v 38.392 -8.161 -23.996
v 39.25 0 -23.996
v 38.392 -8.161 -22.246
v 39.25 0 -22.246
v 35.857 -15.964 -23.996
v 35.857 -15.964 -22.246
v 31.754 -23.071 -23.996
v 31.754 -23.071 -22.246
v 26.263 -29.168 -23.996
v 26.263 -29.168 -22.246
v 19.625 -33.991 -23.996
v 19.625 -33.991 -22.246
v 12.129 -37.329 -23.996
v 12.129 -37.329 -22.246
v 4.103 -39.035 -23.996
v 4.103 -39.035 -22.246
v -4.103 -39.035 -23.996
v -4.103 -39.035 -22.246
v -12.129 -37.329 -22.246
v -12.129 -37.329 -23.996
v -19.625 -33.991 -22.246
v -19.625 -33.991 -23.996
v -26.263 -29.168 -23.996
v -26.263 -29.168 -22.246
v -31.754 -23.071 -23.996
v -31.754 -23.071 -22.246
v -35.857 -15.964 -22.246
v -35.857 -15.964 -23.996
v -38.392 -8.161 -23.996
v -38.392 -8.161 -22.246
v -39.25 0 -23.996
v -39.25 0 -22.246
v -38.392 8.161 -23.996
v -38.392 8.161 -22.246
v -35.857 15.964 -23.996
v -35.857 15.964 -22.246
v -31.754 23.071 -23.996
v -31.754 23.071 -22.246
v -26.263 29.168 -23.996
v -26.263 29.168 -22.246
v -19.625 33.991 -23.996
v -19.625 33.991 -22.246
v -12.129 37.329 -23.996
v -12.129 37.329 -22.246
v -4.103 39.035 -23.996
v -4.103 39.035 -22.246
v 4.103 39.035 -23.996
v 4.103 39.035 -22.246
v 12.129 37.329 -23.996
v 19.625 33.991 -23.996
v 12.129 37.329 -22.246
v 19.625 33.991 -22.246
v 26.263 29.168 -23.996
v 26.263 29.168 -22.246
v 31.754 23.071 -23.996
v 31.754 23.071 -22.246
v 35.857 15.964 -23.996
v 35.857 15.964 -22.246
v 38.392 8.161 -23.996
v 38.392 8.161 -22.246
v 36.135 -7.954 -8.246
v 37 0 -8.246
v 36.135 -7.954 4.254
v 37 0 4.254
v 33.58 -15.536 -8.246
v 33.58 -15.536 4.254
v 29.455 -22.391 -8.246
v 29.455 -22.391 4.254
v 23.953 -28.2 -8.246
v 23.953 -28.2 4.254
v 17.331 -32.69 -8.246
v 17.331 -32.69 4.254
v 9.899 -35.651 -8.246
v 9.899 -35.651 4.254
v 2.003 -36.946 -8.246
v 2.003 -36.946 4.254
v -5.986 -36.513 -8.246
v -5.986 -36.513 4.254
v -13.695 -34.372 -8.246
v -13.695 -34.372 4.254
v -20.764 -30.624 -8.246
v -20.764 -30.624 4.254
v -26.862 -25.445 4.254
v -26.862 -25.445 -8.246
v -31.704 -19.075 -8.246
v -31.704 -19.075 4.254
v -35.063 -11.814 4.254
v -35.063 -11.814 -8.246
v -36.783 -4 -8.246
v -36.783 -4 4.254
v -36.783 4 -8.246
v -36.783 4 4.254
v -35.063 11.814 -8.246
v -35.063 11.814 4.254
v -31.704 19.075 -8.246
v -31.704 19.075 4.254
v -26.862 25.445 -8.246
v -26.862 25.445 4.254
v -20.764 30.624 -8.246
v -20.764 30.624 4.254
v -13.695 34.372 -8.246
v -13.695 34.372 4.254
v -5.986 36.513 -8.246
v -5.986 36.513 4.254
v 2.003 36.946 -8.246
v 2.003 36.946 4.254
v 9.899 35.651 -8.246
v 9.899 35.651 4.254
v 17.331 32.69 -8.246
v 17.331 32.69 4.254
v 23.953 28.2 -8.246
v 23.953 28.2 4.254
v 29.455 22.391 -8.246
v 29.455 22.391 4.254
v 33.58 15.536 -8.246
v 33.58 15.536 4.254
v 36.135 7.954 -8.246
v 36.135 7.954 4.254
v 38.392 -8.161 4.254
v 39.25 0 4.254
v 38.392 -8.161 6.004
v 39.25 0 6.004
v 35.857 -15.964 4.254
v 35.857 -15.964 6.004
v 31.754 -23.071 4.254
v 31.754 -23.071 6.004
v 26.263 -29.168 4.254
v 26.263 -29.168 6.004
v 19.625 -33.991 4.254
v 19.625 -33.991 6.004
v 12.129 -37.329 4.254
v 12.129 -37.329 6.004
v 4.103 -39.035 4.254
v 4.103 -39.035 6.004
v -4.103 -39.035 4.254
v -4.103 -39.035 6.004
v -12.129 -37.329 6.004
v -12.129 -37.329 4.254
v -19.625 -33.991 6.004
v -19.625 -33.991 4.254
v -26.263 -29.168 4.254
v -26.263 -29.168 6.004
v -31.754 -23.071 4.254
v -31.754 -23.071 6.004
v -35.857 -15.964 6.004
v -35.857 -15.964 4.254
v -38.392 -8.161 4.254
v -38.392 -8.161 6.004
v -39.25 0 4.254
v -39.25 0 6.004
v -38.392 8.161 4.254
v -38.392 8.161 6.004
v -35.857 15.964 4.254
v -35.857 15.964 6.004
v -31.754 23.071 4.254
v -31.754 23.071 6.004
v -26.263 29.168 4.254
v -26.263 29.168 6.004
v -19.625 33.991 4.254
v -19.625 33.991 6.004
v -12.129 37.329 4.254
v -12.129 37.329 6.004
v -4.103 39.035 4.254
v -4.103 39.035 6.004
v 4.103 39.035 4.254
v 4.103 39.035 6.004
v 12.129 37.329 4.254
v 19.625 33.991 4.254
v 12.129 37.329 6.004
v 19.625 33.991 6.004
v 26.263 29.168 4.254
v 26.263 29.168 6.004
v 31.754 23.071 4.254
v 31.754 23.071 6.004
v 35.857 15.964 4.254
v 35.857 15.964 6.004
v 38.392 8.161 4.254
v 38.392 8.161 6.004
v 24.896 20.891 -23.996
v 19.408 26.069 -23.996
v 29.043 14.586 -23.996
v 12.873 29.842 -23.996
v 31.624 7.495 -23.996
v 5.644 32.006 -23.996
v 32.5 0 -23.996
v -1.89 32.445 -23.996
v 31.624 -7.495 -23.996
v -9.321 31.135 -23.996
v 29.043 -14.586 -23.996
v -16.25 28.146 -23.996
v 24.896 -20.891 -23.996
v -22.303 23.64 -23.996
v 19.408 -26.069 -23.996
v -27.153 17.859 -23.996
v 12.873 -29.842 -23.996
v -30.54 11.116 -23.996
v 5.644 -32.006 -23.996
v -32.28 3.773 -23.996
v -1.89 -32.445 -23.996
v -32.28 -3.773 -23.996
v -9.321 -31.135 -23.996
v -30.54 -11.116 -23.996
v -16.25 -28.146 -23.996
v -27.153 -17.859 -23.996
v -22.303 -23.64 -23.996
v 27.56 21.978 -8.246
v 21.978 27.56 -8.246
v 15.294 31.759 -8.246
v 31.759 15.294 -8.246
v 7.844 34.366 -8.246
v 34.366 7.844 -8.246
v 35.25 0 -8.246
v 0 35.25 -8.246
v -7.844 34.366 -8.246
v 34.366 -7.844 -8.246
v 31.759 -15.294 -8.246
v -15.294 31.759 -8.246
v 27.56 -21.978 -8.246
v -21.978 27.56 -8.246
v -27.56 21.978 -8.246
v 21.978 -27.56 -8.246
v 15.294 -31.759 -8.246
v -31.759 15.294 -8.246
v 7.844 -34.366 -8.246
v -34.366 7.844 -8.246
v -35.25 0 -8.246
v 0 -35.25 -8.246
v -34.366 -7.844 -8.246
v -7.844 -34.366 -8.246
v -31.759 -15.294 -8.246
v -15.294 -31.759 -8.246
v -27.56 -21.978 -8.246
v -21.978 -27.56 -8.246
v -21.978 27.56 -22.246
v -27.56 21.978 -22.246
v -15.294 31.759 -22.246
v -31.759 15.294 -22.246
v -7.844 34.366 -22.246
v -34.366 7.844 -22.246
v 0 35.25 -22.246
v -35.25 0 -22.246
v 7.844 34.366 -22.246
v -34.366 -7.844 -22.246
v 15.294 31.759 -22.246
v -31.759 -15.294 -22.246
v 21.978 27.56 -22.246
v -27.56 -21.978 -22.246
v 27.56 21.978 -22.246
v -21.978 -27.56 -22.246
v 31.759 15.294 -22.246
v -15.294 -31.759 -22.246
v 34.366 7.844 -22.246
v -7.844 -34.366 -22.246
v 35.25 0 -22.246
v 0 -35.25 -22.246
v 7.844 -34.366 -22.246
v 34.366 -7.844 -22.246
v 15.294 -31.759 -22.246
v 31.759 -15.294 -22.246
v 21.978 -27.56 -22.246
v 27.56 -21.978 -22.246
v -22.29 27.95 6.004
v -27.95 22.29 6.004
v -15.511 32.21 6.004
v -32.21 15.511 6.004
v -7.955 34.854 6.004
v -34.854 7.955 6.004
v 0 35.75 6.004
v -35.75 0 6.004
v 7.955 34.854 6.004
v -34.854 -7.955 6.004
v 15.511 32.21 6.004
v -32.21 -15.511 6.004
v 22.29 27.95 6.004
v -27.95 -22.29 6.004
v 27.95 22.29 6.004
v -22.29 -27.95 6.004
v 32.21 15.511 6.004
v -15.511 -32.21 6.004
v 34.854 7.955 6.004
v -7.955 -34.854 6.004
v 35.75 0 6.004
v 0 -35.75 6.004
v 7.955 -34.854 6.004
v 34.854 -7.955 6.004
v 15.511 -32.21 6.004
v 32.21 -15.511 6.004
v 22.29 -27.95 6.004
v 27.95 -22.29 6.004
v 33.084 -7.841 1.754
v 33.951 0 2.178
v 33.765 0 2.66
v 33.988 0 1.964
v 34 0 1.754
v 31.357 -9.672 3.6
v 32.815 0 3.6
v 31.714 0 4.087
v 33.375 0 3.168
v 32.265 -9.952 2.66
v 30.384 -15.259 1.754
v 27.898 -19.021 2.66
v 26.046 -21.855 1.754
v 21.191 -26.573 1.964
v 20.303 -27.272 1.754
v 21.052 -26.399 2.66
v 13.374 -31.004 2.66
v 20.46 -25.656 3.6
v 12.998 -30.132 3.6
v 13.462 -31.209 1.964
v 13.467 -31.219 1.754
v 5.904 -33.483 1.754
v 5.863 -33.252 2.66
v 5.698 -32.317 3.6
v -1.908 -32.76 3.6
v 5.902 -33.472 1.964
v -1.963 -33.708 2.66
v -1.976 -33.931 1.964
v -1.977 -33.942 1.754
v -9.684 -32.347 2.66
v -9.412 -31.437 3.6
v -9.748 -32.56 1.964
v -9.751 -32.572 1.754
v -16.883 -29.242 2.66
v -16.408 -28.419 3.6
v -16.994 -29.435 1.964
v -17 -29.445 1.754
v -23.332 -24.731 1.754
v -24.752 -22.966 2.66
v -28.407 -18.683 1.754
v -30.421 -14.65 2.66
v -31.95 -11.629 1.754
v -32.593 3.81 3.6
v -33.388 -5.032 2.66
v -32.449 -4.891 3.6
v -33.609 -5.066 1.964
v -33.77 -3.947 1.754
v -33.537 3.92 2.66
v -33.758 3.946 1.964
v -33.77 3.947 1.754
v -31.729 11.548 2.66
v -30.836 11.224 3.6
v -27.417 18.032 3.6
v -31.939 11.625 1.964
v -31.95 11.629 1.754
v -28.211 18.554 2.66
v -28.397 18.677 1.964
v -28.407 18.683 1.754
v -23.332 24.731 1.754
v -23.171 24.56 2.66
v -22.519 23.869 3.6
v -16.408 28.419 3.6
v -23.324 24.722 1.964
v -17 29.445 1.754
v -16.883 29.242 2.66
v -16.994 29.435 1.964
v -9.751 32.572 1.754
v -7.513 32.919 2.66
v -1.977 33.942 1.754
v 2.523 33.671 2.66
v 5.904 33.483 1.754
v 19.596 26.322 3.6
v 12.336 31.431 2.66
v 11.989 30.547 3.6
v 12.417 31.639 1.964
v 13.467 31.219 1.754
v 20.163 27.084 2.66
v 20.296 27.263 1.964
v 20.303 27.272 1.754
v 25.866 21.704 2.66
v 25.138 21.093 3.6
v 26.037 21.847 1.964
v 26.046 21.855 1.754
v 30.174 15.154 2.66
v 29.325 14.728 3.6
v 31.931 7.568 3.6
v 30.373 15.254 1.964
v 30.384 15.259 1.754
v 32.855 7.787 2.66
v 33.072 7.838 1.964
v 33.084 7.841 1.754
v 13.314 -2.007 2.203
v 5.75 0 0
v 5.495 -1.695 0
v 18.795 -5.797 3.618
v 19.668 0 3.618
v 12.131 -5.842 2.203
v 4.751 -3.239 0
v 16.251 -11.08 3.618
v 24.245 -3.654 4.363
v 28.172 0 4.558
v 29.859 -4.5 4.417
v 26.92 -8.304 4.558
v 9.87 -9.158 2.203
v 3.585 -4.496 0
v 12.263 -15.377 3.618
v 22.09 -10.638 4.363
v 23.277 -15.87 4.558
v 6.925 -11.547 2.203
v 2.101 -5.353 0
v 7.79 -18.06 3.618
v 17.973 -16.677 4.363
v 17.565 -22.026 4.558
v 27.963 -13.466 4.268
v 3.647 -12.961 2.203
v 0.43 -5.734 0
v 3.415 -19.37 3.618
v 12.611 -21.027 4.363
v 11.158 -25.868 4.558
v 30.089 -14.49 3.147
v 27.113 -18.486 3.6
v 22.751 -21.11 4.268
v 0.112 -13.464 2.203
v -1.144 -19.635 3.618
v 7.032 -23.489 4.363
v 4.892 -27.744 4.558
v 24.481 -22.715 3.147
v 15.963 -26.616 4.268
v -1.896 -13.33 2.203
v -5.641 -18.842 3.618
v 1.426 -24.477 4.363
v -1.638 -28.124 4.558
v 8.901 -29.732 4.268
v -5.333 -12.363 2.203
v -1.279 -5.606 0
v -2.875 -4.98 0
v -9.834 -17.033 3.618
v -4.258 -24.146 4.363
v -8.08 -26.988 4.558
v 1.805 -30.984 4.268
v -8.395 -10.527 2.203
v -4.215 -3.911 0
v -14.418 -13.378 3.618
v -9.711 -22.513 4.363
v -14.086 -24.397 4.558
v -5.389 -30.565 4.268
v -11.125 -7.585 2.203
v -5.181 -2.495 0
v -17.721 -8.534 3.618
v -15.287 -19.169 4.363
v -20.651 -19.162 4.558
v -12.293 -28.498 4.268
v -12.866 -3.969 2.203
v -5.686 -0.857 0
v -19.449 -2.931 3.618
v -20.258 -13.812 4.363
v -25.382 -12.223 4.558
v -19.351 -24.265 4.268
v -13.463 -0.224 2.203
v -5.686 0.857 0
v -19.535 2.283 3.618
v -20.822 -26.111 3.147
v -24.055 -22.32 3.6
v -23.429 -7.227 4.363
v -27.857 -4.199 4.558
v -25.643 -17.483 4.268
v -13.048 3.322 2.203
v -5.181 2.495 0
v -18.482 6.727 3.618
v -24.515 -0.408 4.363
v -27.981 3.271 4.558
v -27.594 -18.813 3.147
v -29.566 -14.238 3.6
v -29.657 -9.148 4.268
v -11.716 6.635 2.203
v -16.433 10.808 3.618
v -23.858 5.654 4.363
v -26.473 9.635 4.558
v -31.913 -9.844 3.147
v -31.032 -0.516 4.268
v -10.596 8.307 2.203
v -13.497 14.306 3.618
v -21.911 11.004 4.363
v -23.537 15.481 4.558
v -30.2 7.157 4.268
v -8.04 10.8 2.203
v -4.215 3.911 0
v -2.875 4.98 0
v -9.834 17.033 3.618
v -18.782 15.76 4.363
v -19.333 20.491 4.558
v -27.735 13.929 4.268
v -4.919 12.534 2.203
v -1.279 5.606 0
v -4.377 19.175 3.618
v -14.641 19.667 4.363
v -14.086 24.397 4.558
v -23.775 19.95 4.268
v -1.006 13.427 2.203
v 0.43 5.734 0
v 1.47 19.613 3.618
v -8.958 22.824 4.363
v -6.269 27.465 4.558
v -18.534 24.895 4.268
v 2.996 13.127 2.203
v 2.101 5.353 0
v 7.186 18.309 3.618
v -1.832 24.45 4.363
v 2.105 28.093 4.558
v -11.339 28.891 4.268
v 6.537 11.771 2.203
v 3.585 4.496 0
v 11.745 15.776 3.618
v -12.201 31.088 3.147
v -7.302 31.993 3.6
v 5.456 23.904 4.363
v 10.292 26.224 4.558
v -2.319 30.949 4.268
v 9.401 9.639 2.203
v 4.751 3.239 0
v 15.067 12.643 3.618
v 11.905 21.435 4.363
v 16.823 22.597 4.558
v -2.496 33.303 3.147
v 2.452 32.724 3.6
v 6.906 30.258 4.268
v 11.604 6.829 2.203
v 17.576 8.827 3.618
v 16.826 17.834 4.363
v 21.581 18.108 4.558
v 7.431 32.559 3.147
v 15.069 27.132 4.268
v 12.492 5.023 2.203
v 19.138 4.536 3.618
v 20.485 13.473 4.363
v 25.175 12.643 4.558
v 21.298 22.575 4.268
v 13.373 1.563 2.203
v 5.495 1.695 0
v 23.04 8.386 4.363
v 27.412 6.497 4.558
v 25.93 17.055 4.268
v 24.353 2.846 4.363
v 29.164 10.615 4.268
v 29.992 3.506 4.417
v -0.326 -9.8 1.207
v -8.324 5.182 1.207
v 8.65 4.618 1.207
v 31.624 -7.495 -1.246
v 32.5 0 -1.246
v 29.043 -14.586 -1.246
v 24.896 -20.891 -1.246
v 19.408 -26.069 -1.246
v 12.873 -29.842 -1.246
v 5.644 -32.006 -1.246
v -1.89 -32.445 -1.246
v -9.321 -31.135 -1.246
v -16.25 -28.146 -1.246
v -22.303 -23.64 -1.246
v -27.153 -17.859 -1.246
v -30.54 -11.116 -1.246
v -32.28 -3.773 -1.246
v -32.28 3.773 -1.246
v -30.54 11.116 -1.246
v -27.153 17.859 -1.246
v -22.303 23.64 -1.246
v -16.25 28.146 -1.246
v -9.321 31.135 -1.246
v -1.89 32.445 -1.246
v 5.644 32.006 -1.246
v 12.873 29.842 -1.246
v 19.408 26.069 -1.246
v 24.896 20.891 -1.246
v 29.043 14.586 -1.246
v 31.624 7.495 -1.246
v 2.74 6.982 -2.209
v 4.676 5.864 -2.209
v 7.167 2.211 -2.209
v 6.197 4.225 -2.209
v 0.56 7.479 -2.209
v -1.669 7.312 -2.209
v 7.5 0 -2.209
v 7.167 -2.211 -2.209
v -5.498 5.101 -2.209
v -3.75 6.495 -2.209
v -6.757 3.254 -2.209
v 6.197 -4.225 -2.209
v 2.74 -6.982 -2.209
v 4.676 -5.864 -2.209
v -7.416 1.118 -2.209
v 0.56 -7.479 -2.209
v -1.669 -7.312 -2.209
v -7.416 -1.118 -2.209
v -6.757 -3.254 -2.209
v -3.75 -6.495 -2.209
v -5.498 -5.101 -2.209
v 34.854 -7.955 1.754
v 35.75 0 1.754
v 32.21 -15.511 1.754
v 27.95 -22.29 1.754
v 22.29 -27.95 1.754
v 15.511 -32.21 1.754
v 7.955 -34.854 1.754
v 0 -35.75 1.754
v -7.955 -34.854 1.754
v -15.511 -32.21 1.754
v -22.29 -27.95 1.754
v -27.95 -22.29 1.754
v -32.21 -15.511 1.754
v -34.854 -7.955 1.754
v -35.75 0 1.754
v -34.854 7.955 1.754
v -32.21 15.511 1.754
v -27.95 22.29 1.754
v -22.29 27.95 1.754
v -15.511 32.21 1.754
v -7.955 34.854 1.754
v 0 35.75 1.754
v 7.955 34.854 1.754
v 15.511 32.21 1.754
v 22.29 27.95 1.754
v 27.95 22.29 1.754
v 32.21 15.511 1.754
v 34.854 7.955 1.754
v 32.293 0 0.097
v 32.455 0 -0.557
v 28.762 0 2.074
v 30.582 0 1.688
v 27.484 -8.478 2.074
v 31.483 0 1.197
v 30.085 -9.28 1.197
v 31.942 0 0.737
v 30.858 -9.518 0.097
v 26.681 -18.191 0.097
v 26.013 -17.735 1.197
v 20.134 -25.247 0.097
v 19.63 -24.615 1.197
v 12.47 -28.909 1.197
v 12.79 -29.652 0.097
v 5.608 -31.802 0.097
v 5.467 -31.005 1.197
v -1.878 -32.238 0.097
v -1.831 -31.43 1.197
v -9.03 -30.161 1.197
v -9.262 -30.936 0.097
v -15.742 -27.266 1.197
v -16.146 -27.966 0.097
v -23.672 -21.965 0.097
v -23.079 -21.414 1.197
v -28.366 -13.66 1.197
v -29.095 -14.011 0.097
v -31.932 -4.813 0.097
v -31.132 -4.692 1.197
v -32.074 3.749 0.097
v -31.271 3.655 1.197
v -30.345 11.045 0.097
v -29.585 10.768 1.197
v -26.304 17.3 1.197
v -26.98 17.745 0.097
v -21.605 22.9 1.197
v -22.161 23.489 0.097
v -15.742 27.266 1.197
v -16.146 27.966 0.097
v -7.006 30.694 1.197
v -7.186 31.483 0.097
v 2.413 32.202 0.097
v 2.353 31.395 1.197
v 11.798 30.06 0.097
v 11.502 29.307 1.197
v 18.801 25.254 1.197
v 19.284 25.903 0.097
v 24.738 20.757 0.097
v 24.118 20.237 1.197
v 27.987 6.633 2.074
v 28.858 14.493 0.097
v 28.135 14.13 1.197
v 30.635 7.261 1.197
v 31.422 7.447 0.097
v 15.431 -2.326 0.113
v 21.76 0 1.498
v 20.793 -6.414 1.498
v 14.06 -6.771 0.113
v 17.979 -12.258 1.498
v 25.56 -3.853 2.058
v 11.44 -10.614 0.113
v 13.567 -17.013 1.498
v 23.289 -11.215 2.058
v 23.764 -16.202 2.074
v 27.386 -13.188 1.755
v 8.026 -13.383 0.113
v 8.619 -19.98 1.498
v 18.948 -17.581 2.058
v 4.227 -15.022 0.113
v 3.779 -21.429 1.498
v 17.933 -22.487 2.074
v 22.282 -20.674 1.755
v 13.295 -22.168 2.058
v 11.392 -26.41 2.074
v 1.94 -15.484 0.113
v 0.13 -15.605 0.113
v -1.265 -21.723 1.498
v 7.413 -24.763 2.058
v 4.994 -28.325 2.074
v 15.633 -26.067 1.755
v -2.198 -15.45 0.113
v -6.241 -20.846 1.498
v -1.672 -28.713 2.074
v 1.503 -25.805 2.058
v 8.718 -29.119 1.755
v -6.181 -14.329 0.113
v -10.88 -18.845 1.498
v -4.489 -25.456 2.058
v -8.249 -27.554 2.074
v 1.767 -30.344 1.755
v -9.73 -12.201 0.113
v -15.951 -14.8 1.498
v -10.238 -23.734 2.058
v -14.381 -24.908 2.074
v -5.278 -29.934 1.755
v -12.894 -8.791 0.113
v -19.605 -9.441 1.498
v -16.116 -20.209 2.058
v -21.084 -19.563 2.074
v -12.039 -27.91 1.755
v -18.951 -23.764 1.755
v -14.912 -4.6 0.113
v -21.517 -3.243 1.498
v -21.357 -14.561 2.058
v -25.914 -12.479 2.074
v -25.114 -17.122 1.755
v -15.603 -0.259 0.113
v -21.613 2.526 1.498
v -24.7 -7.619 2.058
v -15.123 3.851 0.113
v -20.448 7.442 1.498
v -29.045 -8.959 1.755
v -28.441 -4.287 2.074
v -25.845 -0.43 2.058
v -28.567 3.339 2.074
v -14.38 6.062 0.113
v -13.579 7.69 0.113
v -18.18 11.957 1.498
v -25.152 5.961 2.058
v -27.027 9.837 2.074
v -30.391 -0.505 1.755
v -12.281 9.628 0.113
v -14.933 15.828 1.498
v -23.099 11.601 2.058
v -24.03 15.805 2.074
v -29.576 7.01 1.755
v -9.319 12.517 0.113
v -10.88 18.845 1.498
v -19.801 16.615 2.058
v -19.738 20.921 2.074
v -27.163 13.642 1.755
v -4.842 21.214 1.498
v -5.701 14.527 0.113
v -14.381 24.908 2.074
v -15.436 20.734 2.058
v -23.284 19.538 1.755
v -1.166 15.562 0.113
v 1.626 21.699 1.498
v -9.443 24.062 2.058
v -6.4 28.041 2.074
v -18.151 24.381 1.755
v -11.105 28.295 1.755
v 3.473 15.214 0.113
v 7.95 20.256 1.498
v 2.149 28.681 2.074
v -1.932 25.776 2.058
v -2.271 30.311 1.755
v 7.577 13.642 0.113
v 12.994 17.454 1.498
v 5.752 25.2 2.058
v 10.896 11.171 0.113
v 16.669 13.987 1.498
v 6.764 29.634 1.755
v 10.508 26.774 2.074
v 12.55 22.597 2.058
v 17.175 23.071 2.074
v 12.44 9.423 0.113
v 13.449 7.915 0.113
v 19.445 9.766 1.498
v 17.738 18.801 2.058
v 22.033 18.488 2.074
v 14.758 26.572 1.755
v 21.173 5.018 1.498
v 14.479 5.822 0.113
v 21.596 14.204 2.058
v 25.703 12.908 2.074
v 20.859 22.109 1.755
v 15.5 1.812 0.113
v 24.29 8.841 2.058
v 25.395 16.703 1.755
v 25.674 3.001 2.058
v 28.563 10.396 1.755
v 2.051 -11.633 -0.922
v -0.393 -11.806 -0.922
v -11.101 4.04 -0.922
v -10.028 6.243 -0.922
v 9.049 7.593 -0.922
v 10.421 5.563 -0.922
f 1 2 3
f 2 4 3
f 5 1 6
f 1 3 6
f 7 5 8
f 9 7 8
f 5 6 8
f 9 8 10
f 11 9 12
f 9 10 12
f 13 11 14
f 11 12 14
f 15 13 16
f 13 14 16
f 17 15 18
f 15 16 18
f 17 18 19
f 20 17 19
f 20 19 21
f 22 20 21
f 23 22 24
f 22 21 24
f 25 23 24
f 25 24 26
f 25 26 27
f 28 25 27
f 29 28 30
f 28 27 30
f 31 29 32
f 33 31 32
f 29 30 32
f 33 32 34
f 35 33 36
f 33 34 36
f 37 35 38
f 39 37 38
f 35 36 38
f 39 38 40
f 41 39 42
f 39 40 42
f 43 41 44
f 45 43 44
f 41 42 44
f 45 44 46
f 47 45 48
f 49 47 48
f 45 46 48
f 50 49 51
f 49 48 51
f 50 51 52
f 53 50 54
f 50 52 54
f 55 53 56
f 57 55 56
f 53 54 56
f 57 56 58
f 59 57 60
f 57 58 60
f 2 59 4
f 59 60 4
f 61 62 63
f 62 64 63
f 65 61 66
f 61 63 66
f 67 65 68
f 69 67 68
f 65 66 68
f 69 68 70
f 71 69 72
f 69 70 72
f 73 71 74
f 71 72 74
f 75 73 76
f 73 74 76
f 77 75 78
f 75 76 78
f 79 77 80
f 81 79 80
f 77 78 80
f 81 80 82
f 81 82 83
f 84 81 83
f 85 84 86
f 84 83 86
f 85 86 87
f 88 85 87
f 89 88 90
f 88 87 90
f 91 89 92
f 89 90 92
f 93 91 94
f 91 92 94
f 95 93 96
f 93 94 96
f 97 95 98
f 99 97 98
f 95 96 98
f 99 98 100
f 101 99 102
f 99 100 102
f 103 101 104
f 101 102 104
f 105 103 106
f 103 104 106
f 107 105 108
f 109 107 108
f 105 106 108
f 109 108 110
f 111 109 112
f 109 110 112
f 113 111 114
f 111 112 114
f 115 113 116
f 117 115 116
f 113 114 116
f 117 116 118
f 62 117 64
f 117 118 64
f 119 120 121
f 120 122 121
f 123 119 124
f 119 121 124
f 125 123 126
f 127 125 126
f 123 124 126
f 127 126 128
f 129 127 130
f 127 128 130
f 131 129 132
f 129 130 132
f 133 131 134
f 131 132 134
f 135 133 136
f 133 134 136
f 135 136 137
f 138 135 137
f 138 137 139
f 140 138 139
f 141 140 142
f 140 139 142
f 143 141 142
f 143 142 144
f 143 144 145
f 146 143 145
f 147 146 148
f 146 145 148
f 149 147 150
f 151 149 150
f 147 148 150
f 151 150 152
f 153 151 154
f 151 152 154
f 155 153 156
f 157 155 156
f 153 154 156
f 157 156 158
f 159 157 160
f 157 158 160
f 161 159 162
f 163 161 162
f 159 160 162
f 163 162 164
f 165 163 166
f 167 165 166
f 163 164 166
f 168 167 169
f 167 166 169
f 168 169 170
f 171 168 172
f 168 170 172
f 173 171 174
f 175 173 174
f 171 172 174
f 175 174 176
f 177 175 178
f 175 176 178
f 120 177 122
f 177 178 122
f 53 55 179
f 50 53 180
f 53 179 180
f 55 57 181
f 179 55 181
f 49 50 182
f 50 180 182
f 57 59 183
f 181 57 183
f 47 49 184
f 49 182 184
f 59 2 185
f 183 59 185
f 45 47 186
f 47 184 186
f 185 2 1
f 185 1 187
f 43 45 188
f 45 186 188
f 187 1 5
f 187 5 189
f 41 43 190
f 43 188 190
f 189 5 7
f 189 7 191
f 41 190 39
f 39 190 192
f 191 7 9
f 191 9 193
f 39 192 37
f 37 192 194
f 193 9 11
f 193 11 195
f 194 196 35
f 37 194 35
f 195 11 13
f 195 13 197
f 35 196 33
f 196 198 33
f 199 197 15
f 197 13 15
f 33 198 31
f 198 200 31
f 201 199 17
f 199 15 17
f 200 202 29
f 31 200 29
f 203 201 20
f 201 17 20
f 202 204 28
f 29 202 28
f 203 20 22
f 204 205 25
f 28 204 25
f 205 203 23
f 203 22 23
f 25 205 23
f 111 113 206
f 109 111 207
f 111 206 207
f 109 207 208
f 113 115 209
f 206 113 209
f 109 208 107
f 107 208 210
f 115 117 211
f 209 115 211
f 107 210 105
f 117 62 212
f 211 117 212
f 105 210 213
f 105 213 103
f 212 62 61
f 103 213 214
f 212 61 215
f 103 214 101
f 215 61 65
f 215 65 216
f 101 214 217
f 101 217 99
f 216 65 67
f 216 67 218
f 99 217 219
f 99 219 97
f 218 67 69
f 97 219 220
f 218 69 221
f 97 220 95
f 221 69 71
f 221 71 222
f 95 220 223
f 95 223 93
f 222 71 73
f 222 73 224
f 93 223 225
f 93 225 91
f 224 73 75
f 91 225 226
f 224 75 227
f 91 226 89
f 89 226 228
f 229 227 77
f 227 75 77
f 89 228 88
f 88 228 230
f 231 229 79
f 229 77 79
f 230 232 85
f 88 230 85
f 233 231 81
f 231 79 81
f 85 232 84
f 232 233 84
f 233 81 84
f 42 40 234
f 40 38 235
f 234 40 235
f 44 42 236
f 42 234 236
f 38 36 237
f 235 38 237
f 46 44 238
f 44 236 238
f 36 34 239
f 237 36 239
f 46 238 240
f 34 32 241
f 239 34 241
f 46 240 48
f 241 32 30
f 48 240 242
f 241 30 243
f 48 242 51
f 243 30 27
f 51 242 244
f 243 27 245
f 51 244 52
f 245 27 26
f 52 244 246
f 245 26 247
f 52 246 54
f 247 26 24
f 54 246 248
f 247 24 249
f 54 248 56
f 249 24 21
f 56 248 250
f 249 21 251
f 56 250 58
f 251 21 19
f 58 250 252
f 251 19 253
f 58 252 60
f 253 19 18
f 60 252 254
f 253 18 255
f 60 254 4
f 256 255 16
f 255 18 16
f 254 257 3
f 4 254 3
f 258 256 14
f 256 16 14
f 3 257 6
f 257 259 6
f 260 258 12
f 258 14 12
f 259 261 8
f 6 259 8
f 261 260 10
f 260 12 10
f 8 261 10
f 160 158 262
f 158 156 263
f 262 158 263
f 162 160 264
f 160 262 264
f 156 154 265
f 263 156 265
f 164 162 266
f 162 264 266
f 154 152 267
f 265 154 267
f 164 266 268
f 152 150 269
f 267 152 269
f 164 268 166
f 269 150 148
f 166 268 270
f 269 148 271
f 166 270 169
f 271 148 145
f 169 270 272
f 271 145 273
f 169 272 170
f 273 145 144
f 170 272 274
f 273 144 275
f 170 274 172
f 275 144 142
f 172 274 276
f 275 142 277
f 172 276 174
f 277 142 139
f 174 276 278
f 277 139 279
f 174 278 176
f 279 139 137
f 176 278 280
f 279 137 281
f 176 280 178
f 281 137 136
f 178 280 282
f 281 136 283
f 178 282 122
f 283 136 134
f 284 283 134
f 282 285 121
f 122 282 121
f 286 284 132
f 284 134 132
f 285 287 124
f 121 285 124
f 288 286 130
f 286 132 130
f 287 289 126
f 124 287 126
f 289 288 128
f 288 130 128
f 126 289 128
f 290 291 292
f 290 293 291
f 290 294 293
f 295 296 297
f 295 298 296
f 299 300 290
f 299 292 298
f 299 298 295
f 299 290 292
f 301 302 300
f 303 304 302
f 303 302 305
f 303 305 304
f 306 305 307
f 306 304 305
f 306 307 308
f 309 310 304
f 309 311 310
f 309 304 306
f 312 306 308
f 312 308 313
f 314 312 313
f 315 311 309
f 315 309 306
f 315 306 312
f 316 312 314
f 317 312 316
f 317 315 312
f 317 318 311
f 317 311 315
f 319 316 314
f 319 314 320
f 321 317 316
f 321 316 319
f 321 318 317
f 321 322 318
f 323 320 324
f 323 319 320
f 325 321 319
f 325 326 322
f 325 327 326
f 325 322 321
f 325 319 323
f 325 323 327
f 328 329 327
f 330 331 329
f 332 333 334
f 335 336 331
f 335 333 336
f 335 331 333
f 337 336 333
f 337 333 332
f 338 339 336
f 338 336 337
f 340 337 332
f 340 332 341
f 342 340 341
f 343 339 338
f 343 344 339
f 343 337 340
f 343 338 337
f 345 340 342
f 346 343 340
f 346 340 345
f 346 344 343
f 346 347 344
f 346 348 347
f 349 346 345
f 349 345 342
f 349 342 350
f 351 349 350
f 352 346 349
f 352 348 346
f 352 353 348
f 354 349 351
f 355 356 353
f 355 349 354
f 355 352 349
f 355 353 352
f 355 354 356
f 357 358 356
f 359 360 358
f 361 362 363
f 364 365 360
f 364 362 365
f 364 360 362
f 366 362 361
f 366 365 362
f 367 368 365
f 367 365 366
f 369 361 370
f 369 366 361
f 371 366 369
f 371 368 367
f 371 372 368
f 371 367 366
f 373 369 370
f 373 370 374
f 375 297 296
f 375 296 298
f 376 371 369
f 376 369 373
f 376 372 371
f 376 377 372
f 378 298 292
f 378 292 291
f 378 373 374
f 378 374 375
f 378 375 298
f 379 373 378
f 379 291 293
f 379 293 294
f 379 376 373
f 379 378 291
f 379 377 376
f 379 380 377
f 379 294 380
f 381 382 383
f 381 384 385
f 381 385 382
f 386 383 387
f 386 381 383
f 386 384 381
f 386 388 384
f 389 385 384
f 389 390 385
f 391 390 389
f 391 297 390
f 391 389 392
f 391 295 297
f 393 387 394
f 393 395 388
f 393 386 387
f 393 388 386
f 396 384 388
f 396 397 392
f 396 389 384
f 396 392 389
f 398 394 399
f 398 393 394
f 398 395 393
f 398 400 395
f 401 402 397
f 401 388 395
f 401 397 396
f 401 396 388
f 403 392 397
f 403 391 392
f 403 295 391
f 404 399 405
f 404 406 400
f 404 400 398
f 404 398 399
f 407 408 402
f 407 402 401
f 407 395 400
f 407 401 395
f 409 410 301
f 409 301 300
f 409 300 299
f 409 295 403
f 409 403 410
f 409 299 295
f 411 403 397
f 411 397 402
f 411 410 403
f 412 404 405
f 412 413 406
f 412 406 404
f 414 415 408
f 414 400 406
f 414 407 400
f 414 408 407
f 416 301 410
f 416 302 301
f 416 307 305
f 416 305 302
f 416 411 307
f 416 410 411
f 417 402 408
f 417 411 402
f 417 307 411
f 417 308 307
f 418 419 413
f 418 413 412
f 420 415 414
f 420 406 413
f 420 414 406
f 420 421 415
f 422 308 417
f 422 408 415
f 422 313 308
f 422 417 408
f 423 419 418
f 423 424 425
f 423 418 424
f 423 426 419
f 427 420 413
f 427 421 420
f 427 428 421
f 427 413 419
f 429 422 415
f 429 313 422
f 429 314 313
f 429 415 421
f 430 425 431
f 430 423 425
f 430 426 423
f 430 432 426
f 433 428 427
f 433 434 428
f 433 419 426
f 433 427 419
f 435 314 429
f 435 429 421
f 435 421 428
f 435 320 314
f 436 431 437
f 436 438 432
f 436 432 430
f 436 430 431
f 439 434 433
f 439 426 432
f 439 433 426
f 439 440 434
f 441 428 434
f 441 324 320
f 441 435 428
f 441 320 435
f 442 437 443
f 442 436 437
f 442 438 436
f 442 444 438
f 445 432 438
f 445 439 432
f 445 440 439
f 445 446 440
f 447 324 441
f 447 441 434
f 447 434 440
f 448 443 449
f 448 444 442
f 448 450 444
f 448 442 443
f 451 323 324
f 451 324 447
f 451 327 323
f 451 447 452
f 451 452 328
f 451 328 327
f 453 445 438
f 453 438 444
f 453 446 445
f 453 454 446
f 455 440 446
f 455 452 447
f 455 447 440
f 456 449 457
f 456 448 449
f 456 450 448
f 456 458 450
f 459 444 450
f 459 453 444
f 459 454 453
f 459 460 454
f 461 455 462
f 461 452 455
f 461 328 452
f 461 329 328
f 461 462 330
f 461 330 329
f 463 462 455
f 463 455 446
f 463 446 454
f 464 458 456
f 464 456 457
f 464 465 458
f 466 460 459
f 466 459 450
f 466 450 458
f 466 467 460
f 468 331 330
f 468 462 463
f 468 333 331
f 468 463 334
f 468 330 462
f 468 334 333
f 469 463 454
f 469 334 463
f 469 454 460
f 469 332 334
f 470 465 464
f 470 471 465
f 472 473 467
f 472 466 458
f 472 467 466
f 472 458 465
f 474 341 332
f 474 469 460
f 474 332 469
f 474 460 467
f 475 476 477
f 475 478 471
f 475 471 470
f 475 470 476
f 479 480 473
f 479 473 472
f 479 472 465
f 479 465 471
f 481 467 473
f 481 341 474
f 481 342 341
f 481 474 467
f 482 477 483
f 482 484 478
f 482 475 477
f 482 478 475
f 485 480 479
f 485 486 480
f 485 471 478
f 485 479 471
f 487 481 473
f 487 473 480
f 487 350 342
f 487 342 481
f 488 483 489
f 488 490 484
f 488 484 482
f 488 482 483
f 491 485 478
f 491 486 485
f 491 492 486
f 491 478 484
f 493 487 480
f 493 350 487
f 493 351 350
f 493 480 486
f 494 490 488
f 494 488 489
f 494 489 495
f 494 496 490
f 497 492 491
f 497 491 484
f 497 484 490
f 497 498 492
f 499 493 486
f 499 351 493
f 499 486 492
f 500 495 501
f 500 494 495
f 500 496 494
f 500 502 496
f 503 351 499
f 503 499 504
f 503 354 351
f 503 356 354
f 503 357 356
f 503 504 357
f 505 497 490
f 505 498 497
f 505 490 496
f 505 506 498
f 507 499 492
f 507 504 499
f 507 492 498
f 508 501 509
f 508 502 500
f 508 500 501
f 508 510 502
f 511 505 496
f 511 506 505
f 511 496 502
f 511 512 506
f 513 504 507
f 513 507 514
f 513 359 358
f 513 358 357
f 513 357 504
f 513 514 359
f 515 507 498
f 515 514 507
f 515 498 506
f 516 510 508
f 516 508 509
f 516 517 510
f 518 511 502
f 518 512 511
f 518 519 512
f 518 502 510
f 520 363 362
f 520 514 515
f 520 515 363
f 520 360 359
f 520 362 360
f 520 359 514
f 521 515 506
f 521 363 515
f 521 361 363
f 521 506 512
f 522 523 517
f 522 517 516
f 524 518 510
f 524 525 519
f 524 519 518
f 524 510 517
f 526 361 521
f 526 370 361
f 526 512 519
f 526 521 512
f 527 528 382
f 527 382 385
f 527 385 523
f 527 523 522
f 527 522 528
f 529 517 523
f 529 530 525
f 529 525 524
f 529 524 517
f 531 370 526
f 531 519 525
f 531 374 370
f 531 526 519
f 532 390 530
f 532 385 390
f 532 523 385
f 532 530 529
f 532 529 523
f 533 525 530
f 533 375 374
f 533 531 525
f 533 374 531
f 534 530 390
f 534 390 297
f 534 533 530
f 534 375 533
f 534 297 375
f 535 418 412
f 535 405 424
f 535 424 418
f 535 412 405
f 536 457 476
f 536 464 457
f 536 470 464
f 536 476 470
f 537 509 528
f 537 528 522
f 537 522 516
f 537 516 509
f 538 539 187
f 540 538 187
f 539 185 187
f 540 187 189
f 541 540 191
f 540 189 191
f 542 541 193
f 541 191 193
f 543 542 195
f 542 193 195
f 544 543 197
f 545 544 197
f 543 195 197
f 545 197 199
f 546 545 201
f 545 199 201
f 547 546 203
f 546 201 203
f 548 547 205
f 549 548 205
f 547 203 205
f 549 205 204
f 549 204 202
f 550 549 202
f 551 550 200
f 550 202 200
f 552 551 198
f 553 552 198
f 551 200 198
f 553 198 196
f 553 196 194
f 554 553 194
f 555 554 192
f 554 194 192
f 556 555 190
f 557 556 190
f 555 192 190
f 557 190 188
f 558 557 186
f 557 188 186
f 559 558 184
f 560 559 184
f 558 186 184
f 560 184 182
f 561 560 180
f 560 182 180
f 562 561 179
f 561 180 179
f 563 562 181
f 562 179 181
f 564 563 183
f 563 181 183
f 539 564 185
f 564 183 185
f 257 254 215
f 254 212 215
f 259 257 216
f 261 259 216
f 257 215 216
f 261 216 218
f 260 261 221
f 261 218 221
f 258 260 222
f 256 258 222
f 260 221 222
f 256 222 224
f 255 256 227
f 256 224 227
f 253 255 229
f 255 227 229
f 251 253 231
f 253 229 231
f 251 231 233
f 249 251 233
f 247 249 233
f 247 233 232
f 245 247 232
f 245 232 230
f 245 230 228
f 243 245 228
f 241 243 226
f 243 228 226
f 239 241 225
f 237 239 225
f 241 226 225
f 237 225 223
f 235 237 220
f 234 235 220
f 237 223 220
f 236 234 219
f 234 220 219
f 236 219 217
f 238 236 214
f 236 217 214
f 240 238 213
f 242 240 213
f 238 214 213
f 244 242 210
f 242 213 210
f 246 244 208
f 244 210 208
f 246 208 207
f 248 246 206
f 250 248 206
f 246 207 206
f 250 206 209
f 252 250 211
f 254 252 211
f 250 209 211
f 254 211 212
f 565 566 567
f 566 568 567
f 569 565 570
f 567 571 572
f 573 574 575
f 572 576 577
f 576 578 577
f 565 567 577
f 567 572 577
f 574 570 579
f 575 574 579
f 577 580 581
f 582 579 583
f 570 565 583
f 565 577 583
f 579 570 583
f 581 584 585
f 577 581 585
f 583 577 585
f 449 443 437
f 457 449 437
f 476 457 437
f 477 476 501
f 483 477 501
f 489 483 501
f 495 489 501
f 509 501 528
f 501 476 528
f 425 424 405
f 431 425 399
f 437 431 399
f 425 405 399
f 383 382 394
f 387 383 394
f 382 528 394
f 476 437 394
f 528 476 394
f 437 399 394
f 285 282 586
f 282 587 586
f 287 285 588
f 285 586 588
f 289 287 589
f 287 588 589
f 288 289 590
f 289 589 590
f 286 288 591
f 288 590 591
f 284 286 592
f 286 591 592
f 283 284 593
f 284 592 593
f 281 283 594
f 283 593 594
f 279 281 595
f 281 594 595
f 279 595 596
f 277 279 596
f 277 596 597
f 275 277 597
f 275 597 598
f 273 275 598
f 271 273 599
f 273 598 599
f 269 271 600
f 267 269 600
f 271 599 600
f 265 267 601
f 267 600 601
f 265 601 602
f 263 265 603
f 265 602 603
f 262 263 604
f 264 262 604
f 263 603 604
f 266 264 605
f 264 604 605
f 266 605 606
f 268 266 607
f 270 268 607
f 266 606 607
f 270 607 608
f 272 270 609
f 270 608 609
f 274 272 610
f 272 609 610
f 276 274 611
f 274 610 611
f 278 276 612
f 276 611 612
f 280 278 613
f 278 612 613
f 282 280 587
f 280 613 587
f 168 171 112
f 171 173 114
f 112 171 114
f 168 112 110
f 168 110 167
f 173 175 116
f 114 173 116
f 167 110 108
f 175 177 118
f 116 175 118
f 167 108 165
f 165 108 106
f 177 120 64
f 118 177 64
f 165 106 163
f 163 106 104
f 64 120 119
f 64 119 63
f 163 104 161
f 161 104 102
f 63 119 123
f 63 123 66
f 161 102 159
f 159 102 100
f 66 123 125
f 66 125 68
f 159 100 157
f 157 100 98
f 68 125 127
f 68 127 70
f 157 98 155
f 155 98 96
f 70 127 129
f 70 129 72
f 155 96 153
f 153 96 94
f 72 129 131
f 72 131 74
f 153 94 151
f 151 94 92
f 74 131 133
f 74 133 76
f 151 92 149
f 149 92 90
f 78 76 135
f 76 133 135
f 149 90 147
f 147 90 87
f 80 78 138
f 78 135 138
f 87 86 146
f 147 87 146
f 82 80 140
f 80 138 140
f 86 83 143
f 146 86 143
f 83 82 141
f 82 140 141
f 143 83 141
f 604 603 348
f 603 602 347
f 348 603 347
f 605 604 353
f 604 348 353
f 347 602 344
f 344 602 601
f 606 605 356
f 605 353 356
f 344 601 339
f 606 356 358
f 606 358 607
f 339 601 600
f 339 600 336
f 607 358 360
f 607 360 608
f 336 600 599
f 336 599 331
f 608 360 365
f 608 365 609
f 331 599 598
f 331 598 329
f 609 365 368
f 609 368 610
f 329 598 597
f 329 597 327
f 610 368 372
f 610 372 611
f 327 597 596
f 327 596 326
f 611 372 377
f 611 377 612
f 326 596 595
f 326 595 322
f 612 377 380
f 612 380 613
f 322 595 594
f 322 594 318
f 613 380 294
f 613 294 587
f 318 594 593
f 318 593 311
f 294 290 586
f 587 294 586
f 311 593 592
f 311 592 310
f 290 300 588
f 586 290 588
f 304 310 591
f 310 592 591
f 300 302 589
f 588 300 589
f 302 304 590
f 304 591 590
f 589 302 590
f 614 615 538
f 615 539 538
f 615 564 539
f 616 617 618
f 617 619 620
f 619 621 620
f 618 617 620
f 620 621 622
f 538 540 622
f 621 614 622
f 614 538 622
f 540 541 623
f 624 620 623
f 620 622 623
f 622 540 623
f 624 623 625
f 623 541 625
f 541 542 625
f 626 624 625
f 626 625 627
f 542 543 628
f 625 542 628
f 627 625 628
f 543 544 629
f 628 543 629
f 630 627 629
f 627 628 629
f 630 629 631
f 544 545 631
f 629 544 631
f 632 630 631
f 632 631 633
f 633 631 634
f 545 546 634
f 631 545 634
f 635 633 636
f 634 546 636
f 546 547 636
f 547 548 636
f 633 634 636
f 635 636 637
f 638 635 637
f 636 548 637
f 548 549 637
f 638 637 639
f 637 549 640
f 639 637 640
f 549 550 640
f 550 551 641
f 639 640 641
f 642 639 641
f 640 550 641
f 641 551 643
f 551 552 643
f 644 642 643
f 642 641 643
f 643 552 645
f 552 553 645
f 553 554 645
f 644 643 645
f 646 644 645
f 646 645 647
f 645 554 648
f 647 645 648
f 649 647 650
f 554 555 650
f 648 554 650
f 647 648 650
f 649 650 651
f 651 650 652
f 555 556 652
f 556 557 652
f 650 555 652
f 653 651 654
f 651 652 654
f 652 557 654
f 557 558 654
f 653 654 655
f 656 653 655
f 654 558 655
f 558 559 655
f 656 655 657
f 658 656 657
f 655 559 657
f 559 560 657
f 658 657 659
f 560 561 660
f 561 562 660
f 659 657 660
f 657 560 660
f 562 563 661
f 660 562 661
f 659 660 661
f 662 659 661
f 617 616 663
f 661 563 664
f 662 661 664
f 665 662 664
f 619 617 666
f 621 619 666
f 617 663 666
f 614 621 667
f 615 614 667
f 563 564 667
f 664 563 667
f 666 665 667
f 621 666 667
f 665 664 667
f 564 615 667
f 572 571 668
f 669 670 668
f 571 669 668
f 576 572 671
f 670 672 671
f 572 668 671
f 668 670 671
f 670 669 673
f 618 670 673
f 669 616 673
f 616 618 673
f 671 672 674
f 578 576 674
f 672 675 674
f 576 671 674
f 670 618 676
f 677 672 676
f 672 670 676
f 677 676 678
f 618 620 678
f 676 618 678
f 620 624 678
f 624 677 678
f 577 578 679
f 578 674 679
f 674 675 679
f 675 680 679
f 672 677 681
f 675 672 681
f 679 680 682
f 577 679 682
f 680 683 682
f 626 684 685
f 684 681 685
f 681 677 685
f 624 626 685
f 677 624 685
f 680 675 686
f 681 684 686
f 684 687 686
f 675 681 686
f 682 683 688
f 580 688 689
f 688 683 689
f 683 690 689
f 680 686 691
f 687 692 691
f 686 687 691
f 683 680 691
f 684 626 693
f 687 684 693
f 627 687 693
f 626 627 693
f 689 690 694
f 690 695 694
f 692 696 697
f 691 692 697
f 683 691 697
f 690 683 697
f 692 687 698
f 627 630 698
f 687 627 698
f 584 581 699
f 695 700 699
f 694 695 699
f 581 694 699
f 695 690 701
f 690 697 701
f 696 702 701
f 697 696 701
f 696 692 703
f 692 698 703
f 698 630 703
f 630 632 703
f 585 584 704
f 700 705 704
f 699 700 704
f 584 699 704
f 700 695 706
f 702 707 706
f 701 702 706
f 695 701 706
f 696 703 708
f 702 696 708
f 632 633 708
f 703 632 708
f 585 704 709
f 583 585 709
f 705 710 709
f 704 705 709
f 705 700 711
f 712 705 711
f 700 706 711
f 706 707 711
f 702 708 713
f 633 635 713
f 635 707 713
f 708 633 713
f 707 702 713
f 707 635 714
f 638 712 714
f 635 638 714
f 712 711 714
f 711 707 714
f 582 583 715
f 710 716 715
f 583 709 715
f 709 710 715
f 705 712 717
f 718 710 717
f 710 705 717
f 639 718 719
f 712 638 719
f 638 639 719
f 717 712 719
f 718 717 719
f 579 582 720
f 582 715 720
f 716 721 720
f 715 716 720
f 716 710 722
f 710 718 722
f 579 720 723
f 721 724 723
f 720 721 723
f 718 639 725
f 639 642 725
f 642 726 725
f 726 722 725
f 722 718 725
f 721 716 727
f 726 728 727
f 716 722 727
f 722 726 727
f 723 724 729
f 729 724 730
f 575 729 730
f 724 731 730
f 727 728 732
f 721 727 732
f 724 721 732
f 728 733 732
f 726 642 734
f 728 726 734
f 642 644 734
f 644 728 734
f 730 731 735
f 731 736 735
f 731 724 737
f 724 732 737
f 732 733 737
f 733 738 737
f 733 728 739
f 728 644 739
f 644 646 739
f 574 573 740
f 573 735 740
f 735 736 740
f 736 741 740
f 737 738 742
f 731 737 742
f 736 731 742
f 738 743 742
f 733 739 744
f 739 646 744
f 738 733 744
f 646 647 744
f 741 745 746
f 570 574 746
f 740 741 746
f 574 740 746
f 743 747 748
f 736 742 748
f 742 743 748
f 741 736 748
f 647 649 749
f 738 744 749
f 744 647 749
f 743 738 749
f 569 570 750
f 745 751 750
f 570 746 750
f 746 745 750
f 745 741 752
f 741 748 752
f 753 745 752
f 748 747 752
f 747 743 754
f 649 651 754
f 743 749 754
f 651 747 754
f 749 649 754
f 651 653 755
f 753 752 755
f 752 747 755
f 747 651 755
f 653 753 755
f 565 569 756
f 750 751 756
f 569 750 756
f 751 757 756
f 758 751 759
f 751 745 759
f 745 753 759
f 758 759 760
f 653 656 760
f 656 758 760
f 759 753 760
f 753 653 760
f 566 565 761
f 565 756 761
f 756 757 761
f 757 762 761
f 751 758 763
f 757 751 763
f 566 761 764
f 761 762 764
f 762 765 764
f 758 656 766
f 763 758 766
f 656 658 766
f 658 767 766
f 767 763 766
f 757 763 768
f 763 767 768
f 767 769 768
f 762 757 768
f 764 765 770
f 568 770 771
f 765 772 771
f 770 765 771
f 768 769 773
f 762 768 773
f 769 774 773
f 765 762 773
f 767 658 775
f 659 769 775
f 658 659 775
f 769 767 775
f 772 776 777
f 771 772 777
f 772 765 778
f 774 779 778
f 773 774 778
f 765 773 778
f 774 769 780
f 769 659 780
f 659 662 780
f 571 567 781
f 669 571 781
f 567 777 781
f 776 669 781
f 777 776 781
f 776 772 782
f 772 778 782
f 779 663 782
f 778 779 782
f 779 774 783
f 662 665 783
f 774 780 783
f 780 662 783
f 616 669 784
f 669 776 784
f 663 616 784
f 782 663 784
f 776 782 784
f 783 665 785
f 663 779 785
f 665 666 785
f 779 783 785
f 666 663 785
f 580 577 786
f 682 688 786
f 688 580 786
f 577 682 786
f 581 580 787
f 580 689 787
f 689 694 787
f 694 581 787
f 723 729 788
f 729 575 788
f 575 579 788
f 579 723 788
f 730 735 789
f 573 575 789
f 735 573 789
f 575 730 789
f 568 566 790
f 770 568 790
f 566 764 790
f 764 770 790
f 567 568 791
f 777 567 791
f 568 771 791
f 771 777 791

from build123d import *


with BuildPart() as part:
    # Sketch1 → Revolve2 (revolve)
    with BuildSketch(Plane(origin=(0, 0, 0), x_dir=(0, 0, -1), z_dir=(1, 0, 0))):
        with BuildLine():
            Line((0, 0), (2.208762887, 0))
            Line((2.208762887, 0), (2.208762887, 7.5))
            add(Edge.make_bspline(
                [(2.208762887, 7.5), (-4.75, 30), (-2, 32.5), (1.246245651, 32.5)],
                knots=[0, 0, 0, 0, 1, 1, 1, 1], degree=3))
            Line((1.246245651, 32.5), (23.996245651, 32.5))
            Line((23.996245651, 32.5), (23.996245651, 39.25))
            Line((23.996245651, 39.25), (22.246245651, 39.25))
            Line((22.246245651, 39.25), (22.246245651, 35.25))
            Line((22.246245651, 35.25), (8.246245651, 35.25))
            Line((8.246245651, 35.25), (8.246245651, 37))
            Line((8.246245651, 37), (-4.253754349, 37))
            Line((-4.253754349, 37), (-4.253754349, 39.25))
            Line((-4.253754349, 39.25), (-6.003754349, 39.25))
            Line((-6.003754349, 39.25), (-6.003754349, 35.75))
            Line((-6.003754349, 35.75), (-1.753754349, 35.75))
            Line((-1.753754349, 35.75), (-1.753754349, 34))
            add(Edge.make_bspline(
                [(0, 5.75), (-7.5, 30), (-4, 34), (-1.753754349, 34)],
                knots=[0, 0, 0, 0, 1, 1, 1, 1], degree=3))
            Line((0, 5.75), (0, 0))
        make_face()
    revolve(axis=Axis((0, 0, 0), (0, 0, -1)))


solid = part.part
